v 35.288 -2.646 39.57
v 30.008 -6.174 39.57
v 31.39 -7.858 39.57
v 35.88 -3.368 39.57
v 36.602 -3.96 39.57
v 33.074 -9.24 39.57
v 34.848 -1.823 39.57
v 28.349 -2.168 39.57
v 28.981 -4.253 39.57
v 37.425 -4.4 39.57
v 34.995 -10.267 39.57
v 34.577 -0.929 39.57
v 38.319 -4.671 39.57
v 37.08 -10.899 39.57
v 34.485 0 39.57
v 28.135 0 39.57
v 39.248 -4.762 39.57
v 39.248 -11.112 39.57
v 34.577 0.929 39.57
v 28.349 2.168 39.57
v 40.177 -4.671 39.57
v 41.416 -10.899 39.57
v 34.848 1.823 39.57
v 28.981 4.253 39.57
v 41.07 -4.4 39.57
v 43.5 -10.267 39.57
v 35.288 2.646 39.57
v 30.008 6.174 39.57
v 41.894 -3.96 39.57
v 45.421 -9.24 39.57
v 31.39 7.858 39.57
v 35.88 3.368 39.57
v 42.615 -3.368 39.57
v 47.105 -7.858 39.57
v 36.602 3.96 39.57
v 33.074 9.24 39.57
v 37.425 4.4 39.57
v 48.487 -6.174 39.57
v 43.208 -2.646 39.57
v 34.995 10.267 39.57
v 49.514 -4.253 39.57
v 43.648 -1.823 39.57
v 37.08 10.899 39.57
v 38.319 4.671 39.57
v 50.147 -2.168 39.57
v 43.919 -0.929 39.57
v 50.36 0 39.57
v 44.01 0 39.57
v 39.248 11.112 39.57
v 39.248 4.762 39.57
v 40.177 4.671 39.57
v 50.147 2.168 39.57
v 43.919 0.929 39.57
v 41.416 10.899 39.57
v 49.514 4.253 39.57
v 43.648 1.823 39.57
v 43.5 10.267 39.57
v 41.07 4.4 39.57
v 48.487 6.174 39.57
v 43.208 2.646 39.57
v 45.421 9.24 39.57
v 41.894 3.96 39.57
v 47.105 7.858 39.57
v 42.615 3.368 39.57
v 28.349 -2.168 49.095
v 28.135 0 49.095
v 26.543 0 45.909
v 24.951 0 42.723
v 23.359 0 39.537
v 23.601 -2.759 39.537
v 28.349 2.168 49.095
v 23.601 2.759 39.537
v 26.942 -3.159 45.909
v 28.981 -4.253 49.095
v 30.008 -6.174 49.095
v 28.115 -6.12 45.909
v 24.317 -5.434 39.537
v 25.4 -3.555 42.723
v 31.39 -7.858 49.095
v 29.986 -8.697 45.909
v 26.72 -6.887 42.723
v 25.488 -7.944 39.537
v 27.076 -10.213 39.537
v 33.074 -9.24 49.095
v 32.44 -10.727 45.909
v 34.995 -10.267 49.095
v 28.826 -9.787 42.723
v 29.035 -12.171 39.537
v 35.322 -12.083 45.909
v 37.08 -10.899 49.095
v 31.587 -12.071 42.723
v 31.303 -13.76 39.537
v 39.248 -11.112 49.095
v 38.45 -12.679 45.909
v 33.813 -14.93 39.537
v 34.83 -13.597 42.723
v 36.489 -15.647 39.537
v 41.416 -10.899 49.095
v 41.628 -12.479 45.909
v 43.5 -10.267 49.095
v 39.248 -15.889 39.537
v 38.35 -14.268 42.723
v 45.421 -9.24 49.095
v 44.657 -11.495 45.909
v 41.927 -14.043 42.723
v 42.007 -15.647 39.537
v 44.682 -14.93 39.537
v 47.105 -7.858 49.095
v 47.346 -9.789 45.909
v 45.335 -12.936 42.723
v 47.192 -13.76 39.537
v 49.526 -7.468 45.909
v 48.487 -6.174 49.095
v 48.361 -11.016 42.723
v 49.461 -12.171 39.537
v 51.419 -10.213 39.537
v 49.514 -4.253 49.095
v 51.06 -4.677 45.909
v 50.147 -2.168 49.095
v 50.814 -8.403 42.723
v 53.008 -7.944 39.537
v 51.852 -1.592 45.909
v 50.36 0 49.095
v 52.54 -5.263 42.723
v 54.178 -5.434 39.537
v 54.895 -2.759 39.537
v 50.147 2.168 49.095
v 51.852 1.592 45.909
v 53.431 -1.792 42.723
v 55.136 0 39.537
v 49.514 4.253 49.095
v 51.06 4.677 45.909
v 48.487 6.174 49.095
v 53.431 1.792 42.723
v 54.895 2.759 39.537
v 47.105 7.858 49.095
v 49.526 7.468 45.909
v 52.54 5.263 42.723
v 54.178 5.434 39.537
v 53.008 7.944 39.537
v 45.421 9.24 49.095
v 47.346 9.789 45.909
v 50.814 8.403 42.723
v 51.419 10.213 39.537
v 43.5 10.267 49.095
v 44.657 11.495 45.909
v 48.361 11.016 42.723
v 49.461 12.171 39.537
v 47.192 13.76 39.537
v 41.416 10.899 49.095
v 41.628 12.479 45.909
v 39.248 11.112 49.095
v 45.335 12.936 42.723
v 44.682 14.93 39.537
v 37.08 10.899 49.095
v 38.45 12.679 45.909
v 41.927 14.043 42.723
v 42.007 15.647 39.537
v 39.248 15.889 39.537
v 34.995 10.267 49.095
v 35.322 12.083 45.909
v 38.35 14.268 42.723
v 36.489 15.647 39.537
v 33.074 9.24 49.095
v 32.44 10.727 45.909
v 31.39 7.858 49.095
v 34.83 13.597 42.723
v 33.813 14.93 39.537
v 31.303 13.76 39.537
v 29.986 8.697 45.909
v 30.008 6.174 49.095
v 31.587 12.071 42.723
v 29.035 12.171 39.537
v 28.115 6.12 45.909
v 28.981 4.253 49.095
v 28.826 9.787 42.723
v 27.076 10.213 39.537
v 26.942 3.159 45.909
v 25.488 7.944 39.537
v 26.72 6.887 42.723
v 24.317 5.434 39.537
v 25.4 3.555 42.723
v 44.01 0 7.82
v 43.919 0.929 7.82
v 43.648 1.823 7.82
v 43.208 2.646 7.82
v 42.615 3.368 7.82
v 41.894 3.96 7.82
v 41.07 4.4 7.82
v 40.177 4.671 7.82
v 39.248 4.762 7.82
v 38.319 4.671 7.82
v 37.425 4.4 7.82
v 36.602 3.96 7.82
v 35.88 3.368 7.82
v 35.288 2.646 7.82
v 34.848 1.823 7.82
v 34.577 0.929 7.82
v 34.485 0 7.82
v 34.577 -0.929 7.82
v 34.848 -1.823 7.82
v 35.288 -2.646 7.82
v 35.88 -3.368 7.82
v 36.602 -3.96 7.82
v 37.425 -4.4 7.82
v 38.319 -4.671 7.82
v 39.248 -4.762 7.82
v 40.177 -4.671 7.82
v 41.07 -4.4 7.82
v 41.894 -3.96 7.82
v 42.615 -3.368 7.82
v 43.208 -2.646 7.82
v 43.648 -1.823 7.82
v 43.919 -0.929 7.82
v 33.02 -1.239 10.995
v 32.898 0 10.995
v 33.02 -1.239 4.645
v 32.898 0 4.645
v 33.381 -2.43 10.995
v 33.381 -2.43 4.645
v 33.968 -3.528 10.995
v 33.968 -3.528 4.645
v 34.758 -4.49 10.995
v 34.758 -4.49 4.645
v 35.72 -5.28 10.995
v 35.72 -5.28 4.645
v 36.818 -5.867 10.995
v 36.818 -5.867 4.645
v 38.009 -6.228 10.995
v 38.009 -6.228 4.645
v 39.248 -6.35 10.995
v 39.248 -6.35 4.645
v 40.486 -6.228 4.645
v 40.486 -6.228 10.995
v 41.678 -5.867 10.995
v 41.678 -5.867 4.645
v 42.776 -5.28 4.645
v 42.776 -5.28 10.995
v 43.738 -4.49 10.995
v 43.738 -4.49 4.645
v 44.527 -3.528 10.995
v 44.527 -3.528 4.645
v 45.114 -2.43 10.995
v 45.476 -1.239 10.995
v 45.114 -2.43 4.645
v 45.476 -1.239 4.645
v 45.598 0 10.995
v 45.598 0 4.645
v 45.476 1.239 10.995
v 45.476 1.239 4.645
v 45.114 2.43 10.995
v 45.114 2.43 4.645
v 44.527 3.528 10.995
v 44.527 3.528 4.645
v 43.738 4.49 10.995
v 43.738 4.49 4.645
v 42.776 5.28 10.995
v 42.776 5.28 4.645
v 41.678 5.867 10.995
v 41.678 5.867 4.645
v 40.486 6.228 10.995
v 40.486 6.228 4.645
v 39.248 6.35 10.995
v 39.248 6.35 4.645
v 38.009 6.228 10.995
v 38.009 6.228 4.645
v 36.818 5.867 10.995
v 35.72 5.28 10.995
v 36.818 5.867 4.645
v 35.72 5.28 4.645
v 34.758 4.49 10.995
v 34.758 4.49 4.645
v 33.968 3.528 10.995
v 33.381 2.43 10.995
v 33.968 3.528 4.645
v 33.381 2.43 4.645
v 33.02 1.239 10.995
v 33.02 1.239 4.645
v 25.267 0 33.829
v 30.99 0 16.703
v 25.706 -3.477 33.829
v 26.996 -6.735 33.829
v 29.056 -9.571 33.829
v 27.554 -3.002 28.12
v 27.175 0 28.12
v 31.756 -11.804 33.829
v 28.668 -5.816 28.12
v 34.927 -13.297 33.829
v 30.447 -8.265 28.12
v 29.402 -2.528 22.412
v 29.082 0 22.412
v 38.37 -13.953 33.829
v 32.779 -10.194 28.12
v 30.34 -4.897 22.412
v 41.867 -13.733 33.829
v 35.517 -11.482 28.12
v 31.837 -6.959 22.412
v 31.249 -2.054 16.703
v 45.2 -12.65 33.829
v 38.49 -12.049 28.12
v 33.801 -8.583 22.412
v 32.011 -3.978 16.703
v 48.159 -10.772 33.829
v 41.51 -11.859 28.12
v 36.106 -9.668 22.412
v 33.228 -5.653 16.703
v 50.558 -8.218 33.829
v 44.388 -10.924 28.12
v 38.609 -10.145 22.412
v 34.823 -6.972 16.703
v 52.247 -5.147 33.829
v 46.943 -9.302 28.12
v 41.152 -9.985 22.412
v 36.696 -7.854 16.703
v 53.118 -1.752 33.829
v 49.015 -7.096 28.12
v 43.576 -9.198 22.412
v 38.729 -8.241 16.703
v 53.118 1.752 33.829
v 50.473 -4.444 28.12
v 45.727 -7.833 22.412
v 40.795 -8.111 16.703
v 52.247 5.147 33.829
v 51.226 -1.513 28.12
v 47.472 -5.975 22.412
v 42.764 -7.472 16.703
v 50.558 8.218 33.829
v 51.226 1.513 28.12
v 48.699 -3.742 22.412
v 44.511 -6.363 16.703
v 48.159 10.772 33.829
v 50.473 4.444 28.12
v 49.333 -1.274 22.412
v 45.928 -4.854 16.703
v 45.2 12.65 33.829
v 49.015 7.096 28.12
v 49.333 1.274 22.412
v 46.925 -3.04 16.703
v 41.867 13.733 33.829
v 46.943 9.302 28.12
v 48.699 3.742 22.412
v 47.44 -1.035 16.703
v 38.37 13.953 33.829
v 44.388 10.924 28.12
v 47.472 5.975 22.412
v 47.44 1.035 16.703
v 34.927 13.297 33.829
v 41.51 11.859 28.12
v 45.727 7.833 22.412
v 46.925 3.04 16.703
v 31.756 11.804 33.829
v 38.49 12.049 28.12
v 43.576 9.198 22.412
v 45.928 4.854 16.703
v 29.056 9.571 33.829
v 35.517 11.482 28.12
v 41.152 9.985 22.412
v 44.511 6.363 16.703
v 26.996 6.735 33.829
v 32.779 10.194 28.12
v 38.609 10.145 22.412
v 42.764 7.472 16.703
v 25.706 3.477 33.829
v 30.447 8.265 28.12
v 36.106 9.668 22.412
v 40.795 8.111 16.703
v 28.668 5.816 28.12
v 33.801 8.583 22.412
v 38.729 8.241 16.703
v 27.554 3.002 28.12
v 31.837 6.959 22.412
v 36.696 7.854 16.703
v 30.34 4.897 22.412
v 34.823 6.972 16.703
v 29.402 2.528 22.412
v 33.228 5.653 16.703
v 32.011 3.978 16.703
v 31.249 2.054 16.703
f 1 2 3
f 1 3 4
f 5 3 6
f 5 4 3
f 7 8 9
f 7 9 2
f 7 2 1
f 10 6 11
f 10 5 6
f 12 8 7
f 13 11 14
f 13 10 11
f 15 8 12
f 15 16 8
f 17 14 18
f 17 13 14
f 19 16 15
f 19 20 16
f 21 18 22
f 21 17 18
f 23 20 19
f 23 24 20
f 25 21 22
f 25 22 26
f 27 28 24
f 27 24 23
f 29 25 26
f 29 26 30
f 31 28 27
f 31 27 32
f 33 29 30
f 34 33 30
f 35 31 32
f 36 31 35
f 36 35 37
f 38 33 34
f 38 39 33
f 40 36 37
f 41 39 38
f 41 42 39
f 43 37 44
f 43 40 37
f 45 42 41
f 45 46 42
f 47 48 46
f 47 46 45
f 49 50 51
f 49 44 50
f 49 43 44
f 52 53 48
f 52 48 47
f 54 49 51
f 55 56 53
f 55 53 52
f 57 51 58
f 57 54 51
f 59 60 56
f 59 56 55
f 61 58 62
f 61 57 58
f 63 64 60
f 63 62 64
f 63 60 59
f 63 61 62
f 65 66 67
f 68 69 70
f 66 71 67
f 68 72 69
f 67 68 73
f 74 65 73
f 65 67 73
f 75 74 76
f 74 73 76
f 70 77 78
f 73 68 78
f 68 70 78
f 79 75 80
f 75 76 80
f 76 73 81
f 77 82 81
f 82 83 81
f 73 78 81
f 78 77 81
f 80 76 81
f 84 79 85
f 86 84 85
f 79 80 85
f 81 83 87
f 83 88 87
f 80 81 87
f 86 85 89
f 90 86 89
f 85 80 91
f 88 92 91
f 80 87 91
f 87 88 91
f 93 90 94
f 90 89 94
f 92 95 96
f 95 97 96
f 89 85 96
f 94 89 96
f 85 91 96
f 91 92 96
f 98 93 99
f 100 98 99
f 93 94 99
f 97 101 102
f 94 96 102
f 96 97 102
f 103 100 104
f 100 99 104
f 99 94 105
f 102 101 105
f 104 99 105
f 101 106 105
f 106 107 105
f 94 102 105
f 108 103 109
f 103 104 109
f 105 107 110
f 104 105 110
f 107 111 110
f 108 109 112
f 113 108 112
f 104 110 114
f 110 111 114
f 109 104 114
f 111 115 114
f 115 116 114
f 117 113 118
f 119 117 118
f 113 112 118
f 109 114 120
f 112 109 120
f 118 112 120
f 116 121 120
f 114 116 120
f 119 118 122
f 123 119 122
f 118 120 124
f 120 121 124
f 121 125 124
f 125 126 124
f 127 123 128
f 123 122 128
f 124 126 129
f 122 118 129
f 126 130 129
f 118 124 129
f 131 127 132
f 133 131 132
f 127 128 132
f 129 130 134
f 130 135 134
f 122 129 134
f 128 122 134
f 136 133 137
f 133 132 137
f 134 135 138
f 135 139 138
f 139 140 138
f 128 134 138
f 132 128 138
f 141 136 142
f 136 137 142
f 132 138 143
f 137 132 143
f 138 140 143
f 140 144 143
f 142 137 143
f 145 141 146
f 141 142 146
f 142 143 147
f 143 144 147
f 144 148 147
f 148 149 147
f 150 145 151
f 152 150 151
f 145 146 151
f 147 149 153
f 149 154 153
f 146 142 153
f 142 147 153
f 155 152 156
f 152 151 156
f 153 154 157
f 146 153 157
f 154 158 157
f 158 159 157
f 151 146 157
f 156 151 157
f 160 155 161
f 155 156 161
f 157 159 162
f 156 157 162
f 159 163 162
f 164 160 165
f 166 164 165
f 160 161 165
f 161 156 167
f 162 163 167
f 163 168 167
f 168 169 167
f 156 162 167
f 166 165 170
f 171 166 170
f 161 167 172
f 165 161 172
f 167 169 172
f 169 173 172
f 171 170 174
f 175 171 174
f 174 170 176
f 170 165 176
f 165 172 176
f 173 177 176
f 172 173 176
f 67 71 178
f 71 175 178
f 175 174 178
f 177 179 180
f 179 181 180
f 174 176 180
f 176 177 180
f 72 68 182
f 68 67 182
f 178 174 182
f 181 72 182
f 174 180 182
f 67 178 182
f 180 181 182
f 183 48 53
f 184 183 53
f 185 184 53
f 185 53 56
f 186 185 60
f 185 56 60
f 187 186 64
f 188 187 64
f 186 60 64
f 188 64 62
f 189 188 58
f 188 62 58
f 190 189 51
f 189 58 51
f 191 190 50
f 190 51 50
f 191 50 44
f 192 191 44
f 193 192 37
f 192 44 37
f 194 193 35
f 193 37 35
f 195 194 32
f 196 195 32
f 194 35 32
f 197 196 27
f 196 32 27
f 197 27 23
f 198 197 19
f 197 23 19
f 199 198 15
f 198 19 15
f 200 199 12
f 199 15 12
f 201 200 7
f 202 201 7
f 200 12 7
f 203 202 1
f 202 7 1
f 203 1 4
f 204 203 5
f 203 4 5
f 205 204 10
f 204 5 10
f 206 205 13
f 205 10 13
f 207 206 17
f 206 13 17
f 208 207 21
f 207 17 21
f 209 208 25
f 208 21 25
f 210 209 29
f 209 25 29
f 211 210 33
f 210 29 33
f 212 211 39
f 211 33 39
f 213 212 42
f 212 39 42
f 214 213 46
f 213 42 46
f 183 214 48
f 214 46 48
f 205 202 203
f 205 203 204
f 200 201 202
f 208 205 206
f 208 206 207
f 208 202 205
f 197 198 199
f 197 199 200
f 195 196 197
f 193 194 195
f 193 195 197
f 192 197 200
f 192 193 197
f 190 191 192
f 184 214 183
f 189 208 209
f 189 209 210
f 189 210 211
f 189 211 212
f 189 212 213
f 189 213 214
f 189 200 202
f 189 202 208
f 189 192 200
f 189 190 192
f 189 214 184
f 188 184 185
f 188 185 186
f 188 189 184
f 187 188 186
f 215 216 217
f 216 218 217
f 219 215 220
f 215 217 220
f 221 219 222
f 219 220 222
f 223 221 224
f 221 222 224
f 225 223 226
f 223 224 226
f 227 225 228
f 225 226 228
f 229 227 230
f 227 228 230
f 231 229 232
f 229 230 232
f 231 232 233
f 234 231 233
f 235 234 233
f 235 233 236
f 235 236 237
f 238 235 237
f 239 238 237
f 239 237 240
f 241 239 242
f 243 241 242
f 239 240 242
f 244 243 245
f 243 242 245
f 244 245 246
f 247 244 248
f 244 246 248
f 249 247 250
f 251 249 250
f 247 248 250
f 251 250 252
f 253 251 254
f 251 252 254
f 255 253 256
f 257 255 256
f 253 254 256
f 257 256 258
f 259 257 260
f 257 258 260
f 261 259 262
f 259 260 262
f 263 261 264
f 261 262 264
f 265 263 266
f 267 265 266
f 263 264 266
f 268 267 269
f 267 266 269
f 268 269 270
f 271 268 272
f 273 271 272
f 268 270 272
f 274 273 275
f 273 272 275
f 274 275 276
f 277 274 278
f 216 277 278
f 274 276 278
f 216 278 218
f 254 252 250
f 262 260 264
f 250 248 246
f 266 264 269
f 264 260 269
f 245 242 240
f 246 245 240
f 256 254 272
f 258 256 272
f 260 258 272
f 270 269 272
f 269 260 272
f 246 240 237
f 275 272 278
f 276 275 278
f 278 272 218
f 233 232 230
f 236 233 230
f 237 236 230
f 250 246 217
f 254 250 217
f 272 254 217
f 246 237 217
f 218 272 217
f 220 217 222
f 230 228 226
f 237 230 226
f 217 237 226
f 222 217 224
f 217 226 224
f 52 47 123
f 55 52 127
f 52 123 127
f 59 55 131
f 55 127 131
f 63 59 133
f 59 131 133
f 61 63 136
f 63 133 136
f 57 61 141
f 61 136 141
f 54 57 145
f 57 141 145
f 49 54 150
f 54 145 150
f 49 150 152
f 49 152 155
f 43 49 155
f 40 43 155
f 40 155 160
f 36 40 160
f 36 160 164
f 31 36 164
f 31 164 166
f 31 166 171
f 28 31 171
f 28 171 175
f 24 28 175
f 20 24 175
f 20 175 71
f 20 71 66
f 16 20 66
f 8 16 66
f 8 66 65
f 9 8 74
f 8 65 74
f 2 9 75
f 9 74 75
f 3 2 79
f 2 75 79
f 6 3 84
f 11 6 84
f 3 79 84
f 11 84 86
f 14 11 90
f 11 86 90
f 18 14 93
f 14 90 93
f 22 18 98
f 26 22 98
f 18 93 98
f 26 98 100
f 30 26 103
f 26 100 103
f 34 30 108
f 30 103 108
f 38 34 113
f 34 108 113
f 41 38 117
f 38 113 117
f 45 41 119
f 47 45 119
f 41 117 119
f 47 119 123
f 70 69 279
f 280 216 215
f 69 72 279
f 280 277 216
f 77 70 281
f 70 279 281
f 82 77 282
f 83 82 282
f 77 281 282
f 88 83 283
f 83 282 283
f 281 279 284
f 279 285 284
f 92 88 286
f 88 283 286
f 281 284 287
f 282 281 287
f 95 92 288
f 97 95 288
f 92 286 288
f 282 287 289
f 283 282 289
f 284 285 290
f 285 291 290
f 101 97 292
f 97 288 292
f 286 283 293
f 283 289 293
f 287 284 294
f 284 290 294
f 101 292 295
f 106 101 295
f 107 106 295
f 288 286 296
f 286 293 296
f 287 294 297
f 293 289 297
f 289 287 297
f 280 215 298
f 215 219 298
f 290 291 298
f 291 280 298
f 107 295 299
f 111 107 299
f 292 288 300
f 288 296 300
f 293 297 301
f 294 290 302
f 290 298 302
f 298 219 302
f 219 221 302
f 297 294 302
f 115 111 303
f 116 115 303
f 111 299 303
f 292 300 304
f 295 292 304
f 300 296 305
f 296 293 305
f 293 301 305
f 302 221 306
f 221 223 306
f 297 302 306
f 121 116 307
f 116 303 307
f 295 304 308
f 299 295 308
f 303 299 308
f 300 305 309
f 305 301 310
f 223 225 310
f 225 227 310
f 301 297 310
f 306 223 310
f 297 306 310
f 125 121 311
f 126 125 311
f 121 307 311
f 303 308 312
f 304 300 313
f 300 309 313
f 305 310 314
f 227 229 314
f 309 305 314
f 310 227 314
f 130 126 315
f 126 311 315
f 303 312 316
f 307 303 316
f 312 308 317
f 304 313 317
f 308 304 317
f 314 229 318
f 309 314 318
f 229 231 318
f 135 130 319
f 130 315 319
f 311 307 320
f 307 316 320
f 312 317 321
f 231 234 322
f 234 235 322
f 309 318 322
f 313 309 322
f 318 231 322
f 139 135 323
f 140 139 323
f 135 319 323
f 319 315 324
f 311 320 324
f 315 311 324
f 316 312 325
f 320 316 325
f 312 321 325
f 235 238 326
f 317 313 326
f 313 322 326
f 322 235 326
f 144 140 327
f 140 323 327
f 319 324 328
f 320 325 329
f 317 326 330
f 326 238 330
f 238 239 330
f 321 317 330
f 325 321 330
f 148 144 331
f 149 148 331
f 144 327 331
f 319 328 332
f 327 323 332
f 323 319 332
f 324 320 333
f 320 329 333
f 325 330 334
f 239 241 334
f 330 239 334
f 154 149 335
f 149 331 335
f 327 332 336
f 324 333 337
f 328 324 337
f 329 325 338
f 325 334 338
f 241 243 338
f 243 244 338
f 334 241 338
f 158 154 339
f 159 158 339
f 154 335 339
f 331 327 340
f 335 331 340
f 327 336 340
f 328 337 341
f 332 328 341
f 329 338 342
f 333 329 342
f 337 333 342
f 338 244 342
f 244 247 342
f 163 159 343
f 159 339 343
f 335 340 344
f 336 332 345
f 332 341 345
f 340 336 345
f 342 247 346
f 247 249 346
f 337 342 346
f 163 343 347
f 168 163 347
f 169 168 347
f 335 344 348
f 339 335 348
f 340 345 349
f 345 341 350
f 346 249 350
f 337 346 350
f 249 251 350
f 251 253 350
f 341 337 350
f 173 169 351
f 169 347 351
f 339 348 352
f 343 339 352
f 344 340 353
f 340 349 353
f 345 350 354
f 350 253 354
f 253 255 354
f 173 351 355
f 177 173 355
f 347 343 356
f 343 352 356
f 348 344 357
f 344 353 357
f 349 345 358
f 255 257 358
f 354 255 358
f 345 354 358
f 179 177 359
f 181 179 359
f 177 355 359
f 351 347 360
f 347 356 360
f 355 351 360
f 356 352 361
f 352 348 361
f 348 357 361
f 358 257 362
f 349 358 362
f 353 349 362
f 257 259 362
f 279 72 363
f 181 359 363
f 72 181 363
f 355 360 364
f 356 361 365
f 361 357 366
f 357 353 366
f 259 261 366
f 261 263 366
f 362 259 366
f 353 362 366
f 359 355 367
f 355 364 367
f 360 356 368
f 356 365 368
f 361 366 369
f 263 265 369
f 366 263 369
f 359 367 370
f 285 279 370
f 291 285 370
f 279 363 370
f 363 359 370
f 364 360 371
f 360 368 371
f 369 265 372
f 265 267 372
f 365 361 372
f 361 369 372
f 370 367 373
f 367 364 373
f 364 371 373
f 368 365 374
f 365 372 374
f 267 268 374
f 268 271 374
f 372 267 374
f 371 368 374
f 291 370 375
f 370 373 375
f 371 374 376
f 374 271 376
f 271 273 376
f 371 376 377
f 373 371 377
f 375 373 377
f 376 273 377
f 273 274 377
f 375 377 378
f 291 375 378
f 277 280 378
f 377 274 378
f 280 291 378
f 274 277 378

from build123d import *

# Parameters (mm, degrees)
F0_R      = 6.35
F1_DEPTH  = 6.35
F2_R      = 15.875
F3_DEPTH  = 44.45
F4_SIZE   = 5.08
F5_SIZE   = 5.08
F6_R      = 10.6348002919
F7_DEPTH  = 6.35
F8_R      = 4.7625
F9_DEPTH  = 31.75
F11_R     = 6.35
F12_DEPTH = 6.35
F13_R     = 6.35
F14_DEPTH = 31.75
F15_R     = 15.875
F16_DEPTH = 6.35
F20_R     = 11.1125
F21_DEPTH = 9.525
F22_R     = 4.7625
F23_DEPTH = 31.75


with BuildPart() as f1:
    # F0 (on Top) → F1 (new body)
    with BuildSketch(Plane.XY):
        with Locations((-69.4737806916, -28.0783642083)):
            Circle(F0_R)
    extrude(amount=F1_DEPTH)

    # F2 (on face) → F3 (join)
    with BuildSketch(Plane.XY.offset(6.35)):
        with Locations((-69.4737806916, -28.0783642083)):
            Circle(F2_R)
    extrude(amount=F3_DEPTH)

    # F4
    f4_edges = [f1.edges().sort_by_distance(p)[0] for p in [
        (-53.598781, -28.078364, 28.575),
        (-85.348781, -28.078364, 6.35),
        (-85.348781, -28.078364, 50.8),
    ]]
    chamfer(f4_edges, length=F4_SIZE)

    # F5
    f5_edges = [f1.edges().sort_by_distance(p)[0] for p in [
        (-53.598781, -28.078364, 28.575),
        (-85.348781, -28.078364, 11.43),
        (-85.348781, -28.078364, 45.72),
    ]]
    chamfer(f5_edges, length=F5_SIZE)

    # F6 (on face) → F7 (cut)
    with BuildSketch(Plane.XY.offset(50.8)):
        with Locations((-69.4737806916, -28.0783642083)):
            Circle(F6_R)
    extrude(amount=-F7_DEPTH, mode=Mode.SUBTRACT)

    # F8 (on face) → F9 (cut)
    with BuildSketch(Plane.XY.offset(44.45)):
        with Locations((-69.4737806916, -28.0783642083)):
            Circle(F8_R)
    extrude(amount=-F9_DEPTH, mode=Mode.SUBTRACT)


with BuildPart() as f12:
    # F11 (on Top) → F12 (new body)
    with BuildSketch(Plane.XY):
        with Locations((-63.7479051948, -45.2827736735)):
            Circle(F11_R)
    extrude(amount=F12_DEPTH)

    # F13 (on face) → F14 (join)
    with BuildSketch(Plane.XY.offset(6.35)):
        with Locations((-63.7479051948, -45.2827736735)):
            Circle(F13_R)
    extrude(amount=F14_DEPTH)

    # F15 (on face) → F16 (join)
    with BuildSketch(Plane.XY.offset(38.1)):
        with Locations((-63.7479051948, -45.2827736735)):
            Circle(F15_R)
    extrude(amount=F16_DEPTH)


with BuildPart() as f18:
    # F17 (on Front) → F18 (revolve)
    with BuildSketch(Plane.XZ):
        Polygon((28.1351623714, 49.0950892346), (23.3591329306, 39.5371243358), (32.8976623714, 10.9950892346), (32.8976623714, 4.6450892346), (39.2476623714, 4.6450892346), (39.2476623714, 49.0950892346), align=None)
    revolve(axis=Axis((39.2476623714, 0, 26.8700892346), (0, 0, 1)))

    # F20 (on face) → F21 (cut)
    with BuildSketch(Plane.XY.offset(49.0950892346)):
        with Locations((39.2476623714, 0)):
            Circle(F20_R)
    extrude(amount=-F21_DEPTH, mode=Mode.SUBTRACT)

    # F22 (on face) → F23 (cut)
    with BuildSketch(Plane.XY.offset(39.5700892346)):
        with Locations((39.2476623714, 0)):
            Circle(F22_R)
    extrude(amount=-F23_DEPTH, mode=Mode.SUBTRACT)


solid = f18.part
